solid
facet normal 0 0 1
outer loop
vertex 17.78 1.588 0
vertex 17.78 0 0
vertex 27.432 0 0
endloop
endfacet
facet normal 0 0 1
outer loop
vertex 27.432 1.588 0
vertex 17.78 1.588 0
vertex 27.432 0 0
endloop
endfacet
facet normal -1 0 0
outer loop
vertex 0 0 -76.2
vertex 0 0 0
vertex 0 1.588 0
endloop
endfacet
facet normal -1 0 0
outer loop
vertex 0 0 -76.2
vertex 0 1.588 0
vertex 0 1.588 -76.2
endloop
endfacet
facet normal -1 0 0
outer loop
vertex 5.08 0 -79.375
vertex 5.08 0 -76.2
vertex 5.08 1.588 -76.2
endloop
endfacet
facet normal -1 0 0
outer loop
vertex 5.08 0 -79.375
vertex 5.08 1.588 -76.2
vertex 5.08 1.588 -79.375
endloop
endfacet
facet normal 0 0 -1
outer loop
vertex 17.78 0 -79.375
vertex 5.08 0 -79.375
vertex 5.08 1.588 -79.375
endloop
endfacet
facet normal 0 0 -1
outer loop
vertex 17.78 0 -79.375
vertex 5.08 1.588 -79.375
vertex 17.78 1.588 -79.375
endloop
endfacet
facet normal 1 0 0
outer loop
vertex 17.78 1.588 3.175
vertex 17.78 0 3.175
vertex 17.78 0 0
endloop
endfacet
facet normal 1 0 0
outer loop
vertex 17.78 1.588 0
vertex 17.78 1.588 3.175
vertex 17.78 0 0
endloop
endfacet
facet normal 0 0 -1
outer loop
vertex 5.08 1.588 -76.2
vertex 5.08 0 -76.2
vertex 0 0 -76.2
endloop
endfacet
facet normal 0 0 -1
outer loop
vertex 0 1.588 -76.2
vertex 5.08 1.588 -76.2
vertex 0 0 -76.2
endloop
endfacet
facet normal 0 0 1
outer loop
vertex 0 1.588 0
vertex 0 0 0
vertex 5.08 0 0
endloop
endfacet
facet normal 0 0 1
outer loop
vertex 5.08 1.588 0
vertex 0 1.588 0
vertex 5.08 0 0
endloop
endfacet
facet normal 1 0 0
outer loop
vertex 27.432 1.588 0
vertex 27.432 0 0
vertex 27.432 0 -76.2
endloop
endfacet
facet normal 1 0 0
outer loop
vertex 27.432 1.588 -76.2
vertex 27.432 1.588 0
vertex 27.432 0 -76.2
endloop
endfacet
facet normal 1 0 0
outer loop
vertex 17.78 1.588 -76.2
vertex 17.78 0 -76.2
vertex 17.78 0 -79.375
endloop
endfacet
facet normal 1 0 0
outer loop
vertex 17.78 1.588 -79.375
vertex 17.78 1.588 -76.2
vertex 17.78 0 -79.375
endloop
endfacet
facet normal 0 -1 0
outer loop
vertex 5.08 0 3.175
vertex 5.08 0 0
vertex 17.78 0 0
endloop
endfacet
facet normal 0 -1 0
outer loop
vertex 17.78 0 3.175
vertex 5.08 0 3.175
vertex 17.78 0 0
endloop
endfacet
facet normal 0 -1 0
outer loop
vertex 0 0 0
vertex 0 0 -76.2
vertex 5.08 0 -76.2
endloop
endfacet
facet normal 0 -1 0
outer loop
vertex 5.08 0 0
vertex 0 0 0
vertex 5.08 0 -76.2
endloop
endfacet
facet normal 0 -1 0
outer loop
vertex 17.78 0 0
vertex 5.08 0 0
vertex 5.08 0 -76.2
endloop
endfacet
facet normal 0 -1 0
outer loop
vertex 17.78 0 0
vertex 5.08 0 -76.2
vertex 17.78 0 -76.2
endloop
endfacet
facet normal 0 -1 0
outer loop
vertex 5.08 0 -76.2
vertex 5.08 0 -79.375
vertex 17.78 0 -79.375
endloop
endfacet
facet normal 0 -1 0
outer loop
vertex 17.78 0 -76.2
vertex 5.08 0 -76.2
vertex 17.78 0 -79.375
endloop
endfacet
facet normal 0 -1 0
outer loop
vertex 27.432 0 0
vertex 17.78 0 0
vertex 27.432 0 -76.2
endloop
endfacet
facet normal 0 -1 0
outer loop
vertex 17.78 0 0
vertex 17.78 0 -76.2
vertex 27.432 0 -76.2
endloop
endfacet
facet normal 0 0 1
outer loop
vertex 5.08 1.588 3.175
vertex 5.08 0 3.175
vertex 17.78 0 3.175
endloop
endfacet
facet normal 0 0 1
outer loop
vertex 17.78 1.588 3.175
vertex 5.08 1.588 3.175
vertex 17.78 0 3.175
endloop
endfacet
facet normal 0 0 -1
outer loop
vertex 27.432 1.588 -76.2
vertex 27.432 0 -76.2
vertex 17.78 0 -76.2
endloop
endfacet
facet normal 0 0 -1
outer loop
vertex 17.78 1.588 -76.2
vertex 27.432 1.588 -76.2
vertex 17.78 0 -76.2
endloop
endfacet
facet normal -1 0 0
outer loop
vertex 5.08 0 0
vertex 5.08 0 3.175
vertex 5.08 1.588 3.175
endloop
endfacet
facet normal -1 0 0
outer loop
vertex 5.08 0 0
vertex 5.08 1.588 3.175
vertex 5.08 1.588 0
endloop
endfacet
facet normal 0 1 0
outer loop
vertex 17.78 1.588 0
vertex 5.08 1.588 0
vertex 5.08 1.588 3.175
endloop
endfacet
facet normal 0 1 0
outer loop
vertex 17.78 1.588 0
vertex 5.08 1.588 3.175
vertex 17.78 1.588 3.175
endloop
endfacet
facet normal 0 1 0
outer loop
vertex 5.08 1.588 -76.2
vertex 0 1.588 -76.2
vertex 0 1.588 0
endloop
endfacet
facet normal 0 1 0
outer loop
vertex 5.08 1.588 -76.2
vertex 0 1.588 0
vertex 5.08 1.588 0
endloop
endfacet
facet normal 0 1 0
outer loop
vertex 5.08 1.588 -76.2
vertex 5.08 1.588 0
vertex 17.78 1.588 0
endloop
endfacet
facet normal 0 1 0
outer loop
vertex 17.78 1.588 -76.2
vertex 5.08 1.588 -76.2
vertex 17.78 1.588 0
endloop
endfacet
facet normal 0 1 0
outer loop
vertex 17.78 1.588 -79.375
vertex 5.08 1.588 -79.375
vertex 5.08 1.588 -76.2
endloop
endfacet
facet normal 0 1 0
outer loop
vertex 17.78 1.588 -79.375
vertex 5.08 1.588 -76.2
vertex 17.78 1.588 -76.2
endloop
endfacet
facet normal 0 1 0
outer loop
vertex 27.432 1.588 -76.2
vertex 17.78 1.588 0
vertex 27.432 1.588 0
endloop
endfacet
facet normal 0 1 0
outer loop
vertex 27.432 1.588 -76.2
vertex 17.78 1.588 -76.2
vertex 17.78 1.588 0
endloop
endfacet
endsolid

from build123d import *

# Parameters (mm, degrees)
SKETCH1_W           = 12.7
SKETCH1_H           = 76.2
SKETCH1_W_2         = 5.08
SKETCH1_W_3         = 9.652
SKETCH1_H_2         = 3.175
BOSS_EXTRUDE1_DEPTH = 1.5875


with BuildPart() as part:
    # Sketch1 → Boss-Extrude1 (new body)
    with BuildSketch(Plane(origin=(0, 0, 0), x_dir=(1, 0, 0), z_dir=(0, 1, 0))):
        with Locations((11.43, 38.1)):
            Rectangle(SKETCH1_W, SKETCH1_H)
        with Locations((2.54, 38.1)):
            Rectangle(SKETCH1_W_2, SKETCH1_H)
        with Locations((22.606, 38.1)):
            Rectangle(SKETCH1_W_3, SKETCH1_H)
        with Locations((11.43, -1.5875)):
            Rectangle(SKETCH1_W, SKETCH1_H_2)
        with Locations((11.43, 77.7875)):
            Rectangle(SKETCH1_W, SKETCH1_H_2)
    extrude(amount=BOSS_EXTRUDE1_DEPTH)


solid = part.part
